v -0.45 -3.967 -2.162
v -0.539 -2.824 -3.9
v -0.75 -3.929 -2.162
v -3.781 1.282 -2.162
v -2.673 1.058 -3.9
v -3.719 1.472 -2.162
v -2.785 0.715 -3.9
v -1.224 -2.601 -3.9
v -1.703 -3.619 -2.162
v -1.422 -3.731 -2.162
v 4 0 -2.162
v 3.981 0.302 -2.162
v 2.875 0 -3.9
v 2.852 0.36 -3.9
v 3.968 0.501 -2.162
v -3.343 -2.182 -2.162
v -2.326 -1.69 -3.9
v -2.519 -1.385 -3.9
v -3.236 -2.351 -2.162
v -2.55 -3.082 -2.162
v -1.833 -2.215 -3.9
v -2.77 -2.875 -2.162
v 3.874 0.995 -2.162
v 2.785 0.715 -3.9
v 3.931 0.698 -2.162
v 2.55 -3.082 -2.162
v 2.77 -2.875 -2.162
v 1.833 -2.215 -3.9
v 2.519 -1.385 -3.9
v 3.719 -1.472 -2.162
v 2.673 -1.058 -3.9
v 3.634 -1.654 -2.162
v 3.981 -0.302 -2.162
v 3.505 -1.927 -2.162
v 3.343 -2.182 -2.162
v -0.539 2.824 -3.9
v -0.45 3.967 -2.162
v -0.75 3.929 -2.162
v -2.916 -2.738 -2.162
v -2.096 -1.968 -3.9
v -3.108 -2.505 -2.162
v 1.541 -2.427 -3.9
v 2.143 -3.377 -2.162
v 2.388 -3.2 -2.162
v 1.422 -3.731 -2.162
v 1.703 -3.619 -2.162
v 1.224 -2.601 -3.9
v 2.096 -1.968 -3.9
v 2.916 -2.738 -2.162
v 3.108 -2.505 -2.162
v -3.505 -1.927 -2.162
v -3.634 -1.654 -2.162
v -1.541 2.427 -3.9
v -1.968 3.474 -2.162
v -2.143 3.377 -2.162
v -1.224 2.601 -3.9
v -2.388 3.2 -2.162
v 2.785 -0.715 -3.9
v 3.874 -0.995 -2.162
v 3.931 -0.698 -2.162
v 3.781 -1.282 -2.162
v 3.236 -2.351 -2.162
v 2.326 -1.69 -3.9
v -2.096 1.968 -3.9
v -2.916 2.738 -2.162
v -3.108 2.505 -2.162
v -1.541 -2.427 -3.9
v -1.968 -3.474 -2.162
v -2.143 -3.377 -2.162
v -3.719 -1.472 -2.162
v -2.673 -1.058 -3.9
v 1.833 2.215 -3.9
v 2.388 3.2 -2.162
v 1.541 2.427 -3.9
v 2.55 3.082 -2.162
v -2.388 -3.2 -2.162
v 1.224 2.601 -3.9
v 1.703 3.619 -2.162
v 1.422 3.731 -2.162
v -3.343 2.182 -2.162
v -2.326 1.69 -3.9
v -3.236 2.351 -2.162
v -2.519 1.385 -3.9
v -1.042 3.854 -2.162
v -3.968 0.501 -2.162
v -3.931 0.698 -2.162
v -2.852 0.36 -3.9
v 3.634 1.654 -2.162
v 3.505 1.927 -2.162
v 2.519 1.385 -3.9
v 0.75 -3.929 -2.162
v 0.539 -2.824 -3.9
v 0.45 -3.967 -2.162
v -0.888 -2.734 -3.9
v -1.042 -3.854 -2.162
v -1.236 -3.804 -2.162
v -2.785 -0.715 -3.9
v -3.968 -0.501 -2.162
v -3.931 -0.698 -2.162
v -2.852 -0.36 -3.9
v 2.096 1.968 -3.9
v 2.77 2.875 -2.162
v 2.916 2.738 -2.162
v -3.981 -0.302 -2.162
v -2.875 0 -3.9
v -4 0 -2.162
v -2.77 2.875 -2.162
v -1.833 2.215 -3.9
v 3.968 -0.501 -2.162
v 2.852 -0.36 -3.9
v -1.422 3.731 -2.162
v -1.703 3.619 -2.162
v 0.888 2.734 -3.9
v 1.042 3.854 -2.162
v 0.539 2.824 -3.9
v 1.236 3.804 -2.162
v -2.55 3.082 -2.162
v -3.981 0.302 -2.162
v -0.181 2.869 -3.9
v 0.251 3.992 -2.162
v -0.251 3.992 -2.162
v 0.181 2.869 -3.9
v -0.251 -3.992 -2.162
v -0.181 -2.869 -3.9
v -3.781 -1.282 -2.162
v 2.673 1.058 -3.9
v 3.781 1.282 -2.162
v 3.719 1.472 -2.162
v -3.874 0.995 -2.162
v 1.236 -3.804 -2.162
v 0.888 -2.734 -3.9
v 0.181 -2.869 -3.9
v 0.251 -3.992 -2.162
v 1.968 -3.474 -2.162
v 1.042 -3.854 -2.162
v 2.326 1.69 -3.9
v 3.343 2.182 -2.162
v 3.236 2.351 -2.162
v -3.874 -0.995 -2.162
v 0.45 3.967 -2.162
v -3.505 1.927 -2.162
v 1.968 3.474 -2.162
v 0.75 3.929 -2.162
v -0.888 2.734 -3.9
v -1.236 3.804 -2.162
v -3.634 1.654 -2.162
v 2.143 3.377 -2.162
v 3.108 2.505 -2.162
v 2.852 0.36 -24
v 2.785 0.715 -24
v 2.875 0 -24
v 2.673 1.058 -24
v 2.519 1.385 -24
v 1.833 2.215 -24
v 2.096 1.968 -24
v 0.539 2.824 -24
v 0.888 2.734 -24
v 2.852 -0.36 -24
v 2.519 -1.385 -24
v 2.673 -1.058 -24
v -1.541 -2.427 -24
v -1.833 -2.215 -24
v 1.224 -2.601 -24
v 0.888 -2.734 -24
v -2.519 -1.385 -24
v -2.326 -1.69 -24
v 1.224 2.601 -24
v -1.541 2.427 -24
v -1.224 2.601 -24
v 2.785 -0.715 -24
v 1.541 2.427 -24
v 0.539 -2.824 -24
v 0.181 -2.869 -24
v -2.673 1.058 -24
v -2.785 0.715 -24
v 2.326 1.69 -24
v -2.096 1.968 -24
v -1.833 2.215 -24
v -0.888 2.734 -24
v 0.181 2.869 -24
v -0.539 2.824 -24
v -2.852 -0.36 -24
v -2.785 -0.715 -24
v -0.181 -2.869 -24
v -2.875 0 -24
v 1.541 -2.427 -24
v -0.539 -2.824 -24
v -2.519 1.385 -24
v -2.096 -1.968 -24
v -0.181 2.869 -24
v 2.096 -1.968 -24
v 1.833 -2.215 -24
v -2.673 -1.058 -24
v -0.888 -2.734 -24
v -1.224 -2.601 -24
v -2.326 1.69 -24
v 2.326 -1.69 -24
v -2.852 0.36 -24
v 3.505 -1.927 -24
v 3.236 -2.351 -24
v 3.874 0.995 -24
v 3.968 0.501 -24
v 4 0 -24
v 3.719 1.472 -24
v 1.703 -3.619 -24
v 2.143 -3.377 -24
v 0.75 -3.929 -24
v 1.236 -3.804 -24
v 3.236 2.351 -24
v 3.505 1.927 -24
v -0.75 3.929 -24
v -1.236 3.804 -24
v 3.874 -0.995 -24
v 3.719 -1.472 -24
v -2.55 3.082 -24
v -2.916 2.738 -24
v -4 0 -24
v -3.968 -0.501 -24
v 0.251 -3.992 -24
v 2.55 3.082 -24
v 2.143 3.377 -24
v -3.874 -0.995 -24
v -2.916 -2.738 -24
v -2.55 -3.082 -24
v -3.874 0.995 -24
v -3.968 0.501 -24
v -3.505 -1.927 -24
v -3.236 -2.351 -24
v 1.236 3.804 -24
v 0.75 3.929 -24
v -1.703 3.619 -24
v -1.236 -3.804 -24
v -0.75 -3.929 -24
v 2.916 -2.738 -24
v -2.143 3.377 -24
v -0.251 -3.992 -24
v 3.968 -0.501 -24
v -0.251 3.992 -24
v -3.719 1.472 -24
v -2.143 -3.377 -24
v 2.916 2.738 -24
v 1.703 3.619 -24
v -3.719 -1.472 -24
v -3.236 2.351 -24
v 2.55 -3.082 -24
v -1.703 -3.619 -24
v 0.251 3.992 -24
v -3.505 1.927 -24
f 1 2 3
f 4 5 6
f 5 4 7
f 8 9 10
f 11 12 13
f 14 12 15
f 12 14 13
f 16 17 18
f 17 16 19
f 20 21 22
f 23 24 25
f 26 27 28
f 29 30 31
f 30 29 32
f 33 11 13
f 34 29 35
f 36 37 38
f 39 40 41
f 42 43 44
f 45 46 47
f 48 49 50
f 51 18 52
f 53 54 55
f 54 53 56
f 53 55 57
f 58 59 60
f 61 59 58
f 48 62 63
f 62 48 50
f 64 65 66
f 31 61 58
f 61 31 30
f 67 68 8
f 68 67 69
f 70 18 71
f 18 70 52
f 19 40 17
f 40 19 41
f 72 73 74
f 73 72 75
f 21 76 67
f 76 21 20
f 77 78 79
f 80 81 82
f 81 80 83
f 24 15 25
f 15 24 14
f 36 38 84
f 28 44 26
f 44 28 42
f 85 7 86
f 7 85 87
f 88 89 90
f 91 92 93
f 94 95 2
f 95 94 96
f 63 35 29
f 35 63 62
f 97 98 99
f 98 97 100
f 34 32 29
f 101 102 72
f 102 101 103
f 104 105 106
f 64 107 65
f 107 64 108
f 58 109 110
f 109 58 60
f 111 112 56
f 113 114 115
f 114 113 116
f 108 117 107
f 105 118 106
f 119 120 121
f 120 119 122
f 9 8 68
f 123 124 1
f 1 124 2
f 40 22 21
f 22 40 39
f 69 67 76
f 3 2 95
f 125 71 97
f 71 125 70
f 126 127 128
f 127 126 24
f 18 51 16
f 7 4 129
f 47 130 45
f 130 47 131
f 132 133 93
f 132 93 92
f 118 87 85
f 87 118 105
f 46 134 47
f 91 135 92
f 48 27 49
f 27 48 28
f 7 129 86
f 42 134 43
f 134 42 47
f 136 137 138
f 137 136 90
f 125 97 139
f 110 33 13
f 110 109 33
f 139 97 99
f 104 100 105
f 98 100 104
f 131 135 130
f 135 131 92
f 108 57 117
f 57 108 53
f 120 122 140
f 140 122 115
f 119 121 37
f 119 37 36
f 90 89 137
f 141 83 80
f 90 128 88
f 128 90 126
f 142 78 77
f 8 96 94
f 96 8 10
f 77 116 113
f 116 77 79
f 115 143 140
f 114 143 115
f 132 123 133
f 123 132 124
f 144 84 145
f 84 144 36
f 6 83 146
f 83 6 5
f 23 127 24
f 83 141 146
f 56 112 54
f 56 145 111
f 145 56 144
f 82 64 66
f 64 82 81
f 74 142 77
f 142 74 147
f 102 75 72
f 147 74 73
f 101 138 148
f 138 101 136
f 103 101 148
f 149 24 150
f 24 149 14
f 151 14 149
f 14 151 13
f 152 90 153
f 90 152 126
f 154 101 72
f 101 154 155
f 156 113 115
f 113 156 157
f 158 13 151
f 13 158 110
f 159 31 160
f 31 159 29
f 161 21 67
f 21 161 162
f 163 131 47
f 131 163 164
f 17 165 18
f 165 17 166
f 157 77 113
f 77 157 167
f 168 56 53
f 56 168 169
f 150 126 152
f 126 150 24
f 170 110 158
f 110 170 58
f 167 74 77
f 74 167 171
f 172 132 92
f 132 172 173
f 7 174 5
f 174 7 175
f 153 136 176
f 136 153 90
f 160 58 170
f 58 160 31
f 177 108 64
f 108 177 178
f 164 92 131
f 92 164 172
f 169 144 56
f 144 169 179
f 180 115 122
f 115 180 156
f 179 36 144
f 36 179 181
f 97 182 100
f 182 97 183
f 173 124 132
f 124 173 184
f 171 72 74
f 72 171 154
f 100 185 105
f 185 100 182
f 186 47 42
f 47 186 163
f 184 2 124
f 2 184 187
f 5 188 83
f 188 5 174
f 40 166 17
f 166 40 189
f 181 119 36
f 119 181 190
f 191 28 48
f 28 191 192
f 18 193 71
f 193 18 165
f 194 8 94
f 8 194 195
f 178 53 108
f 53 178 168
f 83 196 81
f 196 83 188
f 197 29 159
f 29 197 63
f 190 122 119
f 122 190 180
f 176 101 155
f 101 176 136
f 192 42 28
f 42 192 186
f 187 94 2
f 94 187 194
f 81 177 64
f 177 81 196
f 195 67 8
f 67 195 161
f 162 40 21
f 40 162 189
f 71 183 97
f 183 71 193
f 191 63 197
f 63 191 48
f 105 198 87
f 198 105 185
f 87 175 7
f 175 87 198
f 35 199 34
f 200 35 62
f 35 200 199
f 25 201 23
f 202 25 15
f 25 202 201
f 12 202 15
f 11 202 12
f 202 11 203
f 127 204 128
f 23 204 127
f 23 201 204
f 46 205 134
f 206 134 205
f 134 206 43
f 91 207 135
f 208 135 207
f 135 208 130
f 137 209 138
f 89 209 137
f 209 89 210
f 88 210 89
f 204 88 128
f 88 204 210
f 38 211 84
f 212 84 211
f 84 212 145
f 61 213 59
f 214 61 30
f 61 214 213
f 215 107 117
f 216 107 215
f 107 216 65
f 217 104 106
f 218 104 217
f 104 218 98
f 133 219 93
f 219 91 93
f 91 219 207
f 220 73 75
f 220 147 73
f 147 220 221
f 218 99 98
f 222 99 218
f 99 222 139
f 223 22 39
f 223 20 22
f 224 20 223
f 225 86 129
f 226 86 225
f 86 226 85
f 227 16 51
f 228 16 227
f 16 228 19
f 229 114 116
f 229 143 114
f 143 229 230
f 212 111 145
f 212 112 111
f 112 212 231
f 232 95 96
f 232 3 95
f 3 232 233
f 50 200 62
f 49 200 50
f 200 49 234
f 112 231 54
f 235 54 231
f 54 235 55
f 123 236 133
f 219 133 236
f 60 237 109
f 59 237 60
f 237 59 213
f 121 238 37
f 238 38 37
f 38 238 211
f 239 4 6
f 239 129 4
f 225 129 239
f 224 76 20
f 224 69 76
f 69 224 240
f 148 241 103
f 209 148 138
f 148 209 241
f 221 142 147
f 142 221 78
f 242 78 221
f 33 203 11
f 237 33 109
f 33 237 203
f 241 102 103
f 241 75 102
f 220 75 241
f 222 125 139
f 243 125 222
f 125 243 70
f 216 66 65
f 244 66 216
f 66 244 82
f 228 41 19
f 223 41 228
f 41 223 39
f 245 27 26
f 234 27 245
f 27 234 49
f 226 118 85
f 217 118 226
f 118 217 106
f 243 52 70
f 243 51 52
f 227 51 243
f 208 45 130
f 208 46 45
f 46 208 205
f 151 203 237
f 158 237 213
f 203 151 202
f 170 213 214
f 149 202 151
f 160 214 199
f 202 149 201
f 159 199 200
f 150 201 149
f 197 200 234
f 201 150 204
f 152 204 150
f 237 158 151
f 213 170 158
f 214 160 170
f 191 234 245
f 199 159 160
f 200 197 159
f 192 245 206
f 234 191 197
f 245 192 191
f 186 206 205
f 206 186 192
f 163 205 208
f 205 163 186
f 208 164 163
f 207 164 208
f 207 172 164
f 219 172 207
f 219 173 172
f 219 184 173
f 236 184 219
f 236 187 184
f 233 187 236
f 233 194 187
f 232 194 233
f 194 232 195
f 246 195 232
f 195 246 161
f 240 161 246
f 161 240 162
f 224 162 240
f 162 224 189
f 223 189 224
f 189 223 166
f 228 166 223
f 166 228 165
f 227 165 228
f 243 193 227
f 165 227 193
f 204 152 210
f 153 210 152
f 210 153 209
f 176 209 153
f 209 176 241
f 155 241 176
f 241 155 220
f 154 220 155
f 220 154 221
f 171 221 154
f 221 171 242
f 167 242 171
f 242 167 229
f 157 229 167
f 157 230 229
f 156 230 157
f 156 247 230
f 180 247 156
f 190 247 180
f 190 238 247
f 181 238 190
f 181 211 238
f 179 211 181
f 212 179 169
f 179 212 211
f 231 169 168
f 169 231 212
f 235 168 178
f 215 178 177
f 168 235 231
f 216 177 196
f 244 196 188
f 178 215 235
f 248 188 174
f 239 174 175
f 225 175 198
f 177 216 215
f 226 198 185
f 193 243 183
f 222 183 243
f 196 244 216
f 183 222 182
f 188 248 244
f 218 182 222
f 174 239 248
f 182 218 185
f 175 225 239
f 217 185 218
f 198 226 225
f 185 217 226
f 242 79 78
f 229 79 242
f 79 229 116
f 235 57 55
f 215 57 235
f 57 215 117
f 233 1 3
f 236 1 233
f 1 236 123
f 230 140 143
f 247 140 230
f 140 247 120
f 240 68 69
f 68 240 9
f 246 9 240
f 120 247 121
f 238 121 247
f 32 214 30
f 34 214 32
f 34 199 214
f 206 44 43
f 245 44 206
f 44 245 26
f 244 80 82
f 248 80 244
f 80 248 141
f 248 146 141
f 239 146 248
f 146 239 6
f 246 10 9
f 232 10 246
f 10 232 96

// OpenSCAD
$fn = 50;

difference() {
	union() {
		translate(v = [0, 0, -24.0]) {
			cylinder(h = 27, r = 4.0);
		}
	}
	union() {
		translate(v = [0, 0, 0]) {
			rotate(a = [0, 0, 0]) {
				difference() {
					union() {
						translate(v = [0, 0, -27.0]) {
							cylinder(h = 27, r = 2.6);
						}
						translate(v = [0, 0, -3.9]) {
							cylinder(h = 3.9, r1 = 2.875, r2 = 5.4);
						}
						translate(v = [0, 0, -27.0]) {
							cylinder(h = 27, r = 2.875);
						}
						translate(v = [0, 0, -27.0]) {
							cylinder(h = 27, r = 2.6);
						}
					}
					union();
				}
			}
		}
		#cylinder(h = 3, r = 5.0);
	}
}
